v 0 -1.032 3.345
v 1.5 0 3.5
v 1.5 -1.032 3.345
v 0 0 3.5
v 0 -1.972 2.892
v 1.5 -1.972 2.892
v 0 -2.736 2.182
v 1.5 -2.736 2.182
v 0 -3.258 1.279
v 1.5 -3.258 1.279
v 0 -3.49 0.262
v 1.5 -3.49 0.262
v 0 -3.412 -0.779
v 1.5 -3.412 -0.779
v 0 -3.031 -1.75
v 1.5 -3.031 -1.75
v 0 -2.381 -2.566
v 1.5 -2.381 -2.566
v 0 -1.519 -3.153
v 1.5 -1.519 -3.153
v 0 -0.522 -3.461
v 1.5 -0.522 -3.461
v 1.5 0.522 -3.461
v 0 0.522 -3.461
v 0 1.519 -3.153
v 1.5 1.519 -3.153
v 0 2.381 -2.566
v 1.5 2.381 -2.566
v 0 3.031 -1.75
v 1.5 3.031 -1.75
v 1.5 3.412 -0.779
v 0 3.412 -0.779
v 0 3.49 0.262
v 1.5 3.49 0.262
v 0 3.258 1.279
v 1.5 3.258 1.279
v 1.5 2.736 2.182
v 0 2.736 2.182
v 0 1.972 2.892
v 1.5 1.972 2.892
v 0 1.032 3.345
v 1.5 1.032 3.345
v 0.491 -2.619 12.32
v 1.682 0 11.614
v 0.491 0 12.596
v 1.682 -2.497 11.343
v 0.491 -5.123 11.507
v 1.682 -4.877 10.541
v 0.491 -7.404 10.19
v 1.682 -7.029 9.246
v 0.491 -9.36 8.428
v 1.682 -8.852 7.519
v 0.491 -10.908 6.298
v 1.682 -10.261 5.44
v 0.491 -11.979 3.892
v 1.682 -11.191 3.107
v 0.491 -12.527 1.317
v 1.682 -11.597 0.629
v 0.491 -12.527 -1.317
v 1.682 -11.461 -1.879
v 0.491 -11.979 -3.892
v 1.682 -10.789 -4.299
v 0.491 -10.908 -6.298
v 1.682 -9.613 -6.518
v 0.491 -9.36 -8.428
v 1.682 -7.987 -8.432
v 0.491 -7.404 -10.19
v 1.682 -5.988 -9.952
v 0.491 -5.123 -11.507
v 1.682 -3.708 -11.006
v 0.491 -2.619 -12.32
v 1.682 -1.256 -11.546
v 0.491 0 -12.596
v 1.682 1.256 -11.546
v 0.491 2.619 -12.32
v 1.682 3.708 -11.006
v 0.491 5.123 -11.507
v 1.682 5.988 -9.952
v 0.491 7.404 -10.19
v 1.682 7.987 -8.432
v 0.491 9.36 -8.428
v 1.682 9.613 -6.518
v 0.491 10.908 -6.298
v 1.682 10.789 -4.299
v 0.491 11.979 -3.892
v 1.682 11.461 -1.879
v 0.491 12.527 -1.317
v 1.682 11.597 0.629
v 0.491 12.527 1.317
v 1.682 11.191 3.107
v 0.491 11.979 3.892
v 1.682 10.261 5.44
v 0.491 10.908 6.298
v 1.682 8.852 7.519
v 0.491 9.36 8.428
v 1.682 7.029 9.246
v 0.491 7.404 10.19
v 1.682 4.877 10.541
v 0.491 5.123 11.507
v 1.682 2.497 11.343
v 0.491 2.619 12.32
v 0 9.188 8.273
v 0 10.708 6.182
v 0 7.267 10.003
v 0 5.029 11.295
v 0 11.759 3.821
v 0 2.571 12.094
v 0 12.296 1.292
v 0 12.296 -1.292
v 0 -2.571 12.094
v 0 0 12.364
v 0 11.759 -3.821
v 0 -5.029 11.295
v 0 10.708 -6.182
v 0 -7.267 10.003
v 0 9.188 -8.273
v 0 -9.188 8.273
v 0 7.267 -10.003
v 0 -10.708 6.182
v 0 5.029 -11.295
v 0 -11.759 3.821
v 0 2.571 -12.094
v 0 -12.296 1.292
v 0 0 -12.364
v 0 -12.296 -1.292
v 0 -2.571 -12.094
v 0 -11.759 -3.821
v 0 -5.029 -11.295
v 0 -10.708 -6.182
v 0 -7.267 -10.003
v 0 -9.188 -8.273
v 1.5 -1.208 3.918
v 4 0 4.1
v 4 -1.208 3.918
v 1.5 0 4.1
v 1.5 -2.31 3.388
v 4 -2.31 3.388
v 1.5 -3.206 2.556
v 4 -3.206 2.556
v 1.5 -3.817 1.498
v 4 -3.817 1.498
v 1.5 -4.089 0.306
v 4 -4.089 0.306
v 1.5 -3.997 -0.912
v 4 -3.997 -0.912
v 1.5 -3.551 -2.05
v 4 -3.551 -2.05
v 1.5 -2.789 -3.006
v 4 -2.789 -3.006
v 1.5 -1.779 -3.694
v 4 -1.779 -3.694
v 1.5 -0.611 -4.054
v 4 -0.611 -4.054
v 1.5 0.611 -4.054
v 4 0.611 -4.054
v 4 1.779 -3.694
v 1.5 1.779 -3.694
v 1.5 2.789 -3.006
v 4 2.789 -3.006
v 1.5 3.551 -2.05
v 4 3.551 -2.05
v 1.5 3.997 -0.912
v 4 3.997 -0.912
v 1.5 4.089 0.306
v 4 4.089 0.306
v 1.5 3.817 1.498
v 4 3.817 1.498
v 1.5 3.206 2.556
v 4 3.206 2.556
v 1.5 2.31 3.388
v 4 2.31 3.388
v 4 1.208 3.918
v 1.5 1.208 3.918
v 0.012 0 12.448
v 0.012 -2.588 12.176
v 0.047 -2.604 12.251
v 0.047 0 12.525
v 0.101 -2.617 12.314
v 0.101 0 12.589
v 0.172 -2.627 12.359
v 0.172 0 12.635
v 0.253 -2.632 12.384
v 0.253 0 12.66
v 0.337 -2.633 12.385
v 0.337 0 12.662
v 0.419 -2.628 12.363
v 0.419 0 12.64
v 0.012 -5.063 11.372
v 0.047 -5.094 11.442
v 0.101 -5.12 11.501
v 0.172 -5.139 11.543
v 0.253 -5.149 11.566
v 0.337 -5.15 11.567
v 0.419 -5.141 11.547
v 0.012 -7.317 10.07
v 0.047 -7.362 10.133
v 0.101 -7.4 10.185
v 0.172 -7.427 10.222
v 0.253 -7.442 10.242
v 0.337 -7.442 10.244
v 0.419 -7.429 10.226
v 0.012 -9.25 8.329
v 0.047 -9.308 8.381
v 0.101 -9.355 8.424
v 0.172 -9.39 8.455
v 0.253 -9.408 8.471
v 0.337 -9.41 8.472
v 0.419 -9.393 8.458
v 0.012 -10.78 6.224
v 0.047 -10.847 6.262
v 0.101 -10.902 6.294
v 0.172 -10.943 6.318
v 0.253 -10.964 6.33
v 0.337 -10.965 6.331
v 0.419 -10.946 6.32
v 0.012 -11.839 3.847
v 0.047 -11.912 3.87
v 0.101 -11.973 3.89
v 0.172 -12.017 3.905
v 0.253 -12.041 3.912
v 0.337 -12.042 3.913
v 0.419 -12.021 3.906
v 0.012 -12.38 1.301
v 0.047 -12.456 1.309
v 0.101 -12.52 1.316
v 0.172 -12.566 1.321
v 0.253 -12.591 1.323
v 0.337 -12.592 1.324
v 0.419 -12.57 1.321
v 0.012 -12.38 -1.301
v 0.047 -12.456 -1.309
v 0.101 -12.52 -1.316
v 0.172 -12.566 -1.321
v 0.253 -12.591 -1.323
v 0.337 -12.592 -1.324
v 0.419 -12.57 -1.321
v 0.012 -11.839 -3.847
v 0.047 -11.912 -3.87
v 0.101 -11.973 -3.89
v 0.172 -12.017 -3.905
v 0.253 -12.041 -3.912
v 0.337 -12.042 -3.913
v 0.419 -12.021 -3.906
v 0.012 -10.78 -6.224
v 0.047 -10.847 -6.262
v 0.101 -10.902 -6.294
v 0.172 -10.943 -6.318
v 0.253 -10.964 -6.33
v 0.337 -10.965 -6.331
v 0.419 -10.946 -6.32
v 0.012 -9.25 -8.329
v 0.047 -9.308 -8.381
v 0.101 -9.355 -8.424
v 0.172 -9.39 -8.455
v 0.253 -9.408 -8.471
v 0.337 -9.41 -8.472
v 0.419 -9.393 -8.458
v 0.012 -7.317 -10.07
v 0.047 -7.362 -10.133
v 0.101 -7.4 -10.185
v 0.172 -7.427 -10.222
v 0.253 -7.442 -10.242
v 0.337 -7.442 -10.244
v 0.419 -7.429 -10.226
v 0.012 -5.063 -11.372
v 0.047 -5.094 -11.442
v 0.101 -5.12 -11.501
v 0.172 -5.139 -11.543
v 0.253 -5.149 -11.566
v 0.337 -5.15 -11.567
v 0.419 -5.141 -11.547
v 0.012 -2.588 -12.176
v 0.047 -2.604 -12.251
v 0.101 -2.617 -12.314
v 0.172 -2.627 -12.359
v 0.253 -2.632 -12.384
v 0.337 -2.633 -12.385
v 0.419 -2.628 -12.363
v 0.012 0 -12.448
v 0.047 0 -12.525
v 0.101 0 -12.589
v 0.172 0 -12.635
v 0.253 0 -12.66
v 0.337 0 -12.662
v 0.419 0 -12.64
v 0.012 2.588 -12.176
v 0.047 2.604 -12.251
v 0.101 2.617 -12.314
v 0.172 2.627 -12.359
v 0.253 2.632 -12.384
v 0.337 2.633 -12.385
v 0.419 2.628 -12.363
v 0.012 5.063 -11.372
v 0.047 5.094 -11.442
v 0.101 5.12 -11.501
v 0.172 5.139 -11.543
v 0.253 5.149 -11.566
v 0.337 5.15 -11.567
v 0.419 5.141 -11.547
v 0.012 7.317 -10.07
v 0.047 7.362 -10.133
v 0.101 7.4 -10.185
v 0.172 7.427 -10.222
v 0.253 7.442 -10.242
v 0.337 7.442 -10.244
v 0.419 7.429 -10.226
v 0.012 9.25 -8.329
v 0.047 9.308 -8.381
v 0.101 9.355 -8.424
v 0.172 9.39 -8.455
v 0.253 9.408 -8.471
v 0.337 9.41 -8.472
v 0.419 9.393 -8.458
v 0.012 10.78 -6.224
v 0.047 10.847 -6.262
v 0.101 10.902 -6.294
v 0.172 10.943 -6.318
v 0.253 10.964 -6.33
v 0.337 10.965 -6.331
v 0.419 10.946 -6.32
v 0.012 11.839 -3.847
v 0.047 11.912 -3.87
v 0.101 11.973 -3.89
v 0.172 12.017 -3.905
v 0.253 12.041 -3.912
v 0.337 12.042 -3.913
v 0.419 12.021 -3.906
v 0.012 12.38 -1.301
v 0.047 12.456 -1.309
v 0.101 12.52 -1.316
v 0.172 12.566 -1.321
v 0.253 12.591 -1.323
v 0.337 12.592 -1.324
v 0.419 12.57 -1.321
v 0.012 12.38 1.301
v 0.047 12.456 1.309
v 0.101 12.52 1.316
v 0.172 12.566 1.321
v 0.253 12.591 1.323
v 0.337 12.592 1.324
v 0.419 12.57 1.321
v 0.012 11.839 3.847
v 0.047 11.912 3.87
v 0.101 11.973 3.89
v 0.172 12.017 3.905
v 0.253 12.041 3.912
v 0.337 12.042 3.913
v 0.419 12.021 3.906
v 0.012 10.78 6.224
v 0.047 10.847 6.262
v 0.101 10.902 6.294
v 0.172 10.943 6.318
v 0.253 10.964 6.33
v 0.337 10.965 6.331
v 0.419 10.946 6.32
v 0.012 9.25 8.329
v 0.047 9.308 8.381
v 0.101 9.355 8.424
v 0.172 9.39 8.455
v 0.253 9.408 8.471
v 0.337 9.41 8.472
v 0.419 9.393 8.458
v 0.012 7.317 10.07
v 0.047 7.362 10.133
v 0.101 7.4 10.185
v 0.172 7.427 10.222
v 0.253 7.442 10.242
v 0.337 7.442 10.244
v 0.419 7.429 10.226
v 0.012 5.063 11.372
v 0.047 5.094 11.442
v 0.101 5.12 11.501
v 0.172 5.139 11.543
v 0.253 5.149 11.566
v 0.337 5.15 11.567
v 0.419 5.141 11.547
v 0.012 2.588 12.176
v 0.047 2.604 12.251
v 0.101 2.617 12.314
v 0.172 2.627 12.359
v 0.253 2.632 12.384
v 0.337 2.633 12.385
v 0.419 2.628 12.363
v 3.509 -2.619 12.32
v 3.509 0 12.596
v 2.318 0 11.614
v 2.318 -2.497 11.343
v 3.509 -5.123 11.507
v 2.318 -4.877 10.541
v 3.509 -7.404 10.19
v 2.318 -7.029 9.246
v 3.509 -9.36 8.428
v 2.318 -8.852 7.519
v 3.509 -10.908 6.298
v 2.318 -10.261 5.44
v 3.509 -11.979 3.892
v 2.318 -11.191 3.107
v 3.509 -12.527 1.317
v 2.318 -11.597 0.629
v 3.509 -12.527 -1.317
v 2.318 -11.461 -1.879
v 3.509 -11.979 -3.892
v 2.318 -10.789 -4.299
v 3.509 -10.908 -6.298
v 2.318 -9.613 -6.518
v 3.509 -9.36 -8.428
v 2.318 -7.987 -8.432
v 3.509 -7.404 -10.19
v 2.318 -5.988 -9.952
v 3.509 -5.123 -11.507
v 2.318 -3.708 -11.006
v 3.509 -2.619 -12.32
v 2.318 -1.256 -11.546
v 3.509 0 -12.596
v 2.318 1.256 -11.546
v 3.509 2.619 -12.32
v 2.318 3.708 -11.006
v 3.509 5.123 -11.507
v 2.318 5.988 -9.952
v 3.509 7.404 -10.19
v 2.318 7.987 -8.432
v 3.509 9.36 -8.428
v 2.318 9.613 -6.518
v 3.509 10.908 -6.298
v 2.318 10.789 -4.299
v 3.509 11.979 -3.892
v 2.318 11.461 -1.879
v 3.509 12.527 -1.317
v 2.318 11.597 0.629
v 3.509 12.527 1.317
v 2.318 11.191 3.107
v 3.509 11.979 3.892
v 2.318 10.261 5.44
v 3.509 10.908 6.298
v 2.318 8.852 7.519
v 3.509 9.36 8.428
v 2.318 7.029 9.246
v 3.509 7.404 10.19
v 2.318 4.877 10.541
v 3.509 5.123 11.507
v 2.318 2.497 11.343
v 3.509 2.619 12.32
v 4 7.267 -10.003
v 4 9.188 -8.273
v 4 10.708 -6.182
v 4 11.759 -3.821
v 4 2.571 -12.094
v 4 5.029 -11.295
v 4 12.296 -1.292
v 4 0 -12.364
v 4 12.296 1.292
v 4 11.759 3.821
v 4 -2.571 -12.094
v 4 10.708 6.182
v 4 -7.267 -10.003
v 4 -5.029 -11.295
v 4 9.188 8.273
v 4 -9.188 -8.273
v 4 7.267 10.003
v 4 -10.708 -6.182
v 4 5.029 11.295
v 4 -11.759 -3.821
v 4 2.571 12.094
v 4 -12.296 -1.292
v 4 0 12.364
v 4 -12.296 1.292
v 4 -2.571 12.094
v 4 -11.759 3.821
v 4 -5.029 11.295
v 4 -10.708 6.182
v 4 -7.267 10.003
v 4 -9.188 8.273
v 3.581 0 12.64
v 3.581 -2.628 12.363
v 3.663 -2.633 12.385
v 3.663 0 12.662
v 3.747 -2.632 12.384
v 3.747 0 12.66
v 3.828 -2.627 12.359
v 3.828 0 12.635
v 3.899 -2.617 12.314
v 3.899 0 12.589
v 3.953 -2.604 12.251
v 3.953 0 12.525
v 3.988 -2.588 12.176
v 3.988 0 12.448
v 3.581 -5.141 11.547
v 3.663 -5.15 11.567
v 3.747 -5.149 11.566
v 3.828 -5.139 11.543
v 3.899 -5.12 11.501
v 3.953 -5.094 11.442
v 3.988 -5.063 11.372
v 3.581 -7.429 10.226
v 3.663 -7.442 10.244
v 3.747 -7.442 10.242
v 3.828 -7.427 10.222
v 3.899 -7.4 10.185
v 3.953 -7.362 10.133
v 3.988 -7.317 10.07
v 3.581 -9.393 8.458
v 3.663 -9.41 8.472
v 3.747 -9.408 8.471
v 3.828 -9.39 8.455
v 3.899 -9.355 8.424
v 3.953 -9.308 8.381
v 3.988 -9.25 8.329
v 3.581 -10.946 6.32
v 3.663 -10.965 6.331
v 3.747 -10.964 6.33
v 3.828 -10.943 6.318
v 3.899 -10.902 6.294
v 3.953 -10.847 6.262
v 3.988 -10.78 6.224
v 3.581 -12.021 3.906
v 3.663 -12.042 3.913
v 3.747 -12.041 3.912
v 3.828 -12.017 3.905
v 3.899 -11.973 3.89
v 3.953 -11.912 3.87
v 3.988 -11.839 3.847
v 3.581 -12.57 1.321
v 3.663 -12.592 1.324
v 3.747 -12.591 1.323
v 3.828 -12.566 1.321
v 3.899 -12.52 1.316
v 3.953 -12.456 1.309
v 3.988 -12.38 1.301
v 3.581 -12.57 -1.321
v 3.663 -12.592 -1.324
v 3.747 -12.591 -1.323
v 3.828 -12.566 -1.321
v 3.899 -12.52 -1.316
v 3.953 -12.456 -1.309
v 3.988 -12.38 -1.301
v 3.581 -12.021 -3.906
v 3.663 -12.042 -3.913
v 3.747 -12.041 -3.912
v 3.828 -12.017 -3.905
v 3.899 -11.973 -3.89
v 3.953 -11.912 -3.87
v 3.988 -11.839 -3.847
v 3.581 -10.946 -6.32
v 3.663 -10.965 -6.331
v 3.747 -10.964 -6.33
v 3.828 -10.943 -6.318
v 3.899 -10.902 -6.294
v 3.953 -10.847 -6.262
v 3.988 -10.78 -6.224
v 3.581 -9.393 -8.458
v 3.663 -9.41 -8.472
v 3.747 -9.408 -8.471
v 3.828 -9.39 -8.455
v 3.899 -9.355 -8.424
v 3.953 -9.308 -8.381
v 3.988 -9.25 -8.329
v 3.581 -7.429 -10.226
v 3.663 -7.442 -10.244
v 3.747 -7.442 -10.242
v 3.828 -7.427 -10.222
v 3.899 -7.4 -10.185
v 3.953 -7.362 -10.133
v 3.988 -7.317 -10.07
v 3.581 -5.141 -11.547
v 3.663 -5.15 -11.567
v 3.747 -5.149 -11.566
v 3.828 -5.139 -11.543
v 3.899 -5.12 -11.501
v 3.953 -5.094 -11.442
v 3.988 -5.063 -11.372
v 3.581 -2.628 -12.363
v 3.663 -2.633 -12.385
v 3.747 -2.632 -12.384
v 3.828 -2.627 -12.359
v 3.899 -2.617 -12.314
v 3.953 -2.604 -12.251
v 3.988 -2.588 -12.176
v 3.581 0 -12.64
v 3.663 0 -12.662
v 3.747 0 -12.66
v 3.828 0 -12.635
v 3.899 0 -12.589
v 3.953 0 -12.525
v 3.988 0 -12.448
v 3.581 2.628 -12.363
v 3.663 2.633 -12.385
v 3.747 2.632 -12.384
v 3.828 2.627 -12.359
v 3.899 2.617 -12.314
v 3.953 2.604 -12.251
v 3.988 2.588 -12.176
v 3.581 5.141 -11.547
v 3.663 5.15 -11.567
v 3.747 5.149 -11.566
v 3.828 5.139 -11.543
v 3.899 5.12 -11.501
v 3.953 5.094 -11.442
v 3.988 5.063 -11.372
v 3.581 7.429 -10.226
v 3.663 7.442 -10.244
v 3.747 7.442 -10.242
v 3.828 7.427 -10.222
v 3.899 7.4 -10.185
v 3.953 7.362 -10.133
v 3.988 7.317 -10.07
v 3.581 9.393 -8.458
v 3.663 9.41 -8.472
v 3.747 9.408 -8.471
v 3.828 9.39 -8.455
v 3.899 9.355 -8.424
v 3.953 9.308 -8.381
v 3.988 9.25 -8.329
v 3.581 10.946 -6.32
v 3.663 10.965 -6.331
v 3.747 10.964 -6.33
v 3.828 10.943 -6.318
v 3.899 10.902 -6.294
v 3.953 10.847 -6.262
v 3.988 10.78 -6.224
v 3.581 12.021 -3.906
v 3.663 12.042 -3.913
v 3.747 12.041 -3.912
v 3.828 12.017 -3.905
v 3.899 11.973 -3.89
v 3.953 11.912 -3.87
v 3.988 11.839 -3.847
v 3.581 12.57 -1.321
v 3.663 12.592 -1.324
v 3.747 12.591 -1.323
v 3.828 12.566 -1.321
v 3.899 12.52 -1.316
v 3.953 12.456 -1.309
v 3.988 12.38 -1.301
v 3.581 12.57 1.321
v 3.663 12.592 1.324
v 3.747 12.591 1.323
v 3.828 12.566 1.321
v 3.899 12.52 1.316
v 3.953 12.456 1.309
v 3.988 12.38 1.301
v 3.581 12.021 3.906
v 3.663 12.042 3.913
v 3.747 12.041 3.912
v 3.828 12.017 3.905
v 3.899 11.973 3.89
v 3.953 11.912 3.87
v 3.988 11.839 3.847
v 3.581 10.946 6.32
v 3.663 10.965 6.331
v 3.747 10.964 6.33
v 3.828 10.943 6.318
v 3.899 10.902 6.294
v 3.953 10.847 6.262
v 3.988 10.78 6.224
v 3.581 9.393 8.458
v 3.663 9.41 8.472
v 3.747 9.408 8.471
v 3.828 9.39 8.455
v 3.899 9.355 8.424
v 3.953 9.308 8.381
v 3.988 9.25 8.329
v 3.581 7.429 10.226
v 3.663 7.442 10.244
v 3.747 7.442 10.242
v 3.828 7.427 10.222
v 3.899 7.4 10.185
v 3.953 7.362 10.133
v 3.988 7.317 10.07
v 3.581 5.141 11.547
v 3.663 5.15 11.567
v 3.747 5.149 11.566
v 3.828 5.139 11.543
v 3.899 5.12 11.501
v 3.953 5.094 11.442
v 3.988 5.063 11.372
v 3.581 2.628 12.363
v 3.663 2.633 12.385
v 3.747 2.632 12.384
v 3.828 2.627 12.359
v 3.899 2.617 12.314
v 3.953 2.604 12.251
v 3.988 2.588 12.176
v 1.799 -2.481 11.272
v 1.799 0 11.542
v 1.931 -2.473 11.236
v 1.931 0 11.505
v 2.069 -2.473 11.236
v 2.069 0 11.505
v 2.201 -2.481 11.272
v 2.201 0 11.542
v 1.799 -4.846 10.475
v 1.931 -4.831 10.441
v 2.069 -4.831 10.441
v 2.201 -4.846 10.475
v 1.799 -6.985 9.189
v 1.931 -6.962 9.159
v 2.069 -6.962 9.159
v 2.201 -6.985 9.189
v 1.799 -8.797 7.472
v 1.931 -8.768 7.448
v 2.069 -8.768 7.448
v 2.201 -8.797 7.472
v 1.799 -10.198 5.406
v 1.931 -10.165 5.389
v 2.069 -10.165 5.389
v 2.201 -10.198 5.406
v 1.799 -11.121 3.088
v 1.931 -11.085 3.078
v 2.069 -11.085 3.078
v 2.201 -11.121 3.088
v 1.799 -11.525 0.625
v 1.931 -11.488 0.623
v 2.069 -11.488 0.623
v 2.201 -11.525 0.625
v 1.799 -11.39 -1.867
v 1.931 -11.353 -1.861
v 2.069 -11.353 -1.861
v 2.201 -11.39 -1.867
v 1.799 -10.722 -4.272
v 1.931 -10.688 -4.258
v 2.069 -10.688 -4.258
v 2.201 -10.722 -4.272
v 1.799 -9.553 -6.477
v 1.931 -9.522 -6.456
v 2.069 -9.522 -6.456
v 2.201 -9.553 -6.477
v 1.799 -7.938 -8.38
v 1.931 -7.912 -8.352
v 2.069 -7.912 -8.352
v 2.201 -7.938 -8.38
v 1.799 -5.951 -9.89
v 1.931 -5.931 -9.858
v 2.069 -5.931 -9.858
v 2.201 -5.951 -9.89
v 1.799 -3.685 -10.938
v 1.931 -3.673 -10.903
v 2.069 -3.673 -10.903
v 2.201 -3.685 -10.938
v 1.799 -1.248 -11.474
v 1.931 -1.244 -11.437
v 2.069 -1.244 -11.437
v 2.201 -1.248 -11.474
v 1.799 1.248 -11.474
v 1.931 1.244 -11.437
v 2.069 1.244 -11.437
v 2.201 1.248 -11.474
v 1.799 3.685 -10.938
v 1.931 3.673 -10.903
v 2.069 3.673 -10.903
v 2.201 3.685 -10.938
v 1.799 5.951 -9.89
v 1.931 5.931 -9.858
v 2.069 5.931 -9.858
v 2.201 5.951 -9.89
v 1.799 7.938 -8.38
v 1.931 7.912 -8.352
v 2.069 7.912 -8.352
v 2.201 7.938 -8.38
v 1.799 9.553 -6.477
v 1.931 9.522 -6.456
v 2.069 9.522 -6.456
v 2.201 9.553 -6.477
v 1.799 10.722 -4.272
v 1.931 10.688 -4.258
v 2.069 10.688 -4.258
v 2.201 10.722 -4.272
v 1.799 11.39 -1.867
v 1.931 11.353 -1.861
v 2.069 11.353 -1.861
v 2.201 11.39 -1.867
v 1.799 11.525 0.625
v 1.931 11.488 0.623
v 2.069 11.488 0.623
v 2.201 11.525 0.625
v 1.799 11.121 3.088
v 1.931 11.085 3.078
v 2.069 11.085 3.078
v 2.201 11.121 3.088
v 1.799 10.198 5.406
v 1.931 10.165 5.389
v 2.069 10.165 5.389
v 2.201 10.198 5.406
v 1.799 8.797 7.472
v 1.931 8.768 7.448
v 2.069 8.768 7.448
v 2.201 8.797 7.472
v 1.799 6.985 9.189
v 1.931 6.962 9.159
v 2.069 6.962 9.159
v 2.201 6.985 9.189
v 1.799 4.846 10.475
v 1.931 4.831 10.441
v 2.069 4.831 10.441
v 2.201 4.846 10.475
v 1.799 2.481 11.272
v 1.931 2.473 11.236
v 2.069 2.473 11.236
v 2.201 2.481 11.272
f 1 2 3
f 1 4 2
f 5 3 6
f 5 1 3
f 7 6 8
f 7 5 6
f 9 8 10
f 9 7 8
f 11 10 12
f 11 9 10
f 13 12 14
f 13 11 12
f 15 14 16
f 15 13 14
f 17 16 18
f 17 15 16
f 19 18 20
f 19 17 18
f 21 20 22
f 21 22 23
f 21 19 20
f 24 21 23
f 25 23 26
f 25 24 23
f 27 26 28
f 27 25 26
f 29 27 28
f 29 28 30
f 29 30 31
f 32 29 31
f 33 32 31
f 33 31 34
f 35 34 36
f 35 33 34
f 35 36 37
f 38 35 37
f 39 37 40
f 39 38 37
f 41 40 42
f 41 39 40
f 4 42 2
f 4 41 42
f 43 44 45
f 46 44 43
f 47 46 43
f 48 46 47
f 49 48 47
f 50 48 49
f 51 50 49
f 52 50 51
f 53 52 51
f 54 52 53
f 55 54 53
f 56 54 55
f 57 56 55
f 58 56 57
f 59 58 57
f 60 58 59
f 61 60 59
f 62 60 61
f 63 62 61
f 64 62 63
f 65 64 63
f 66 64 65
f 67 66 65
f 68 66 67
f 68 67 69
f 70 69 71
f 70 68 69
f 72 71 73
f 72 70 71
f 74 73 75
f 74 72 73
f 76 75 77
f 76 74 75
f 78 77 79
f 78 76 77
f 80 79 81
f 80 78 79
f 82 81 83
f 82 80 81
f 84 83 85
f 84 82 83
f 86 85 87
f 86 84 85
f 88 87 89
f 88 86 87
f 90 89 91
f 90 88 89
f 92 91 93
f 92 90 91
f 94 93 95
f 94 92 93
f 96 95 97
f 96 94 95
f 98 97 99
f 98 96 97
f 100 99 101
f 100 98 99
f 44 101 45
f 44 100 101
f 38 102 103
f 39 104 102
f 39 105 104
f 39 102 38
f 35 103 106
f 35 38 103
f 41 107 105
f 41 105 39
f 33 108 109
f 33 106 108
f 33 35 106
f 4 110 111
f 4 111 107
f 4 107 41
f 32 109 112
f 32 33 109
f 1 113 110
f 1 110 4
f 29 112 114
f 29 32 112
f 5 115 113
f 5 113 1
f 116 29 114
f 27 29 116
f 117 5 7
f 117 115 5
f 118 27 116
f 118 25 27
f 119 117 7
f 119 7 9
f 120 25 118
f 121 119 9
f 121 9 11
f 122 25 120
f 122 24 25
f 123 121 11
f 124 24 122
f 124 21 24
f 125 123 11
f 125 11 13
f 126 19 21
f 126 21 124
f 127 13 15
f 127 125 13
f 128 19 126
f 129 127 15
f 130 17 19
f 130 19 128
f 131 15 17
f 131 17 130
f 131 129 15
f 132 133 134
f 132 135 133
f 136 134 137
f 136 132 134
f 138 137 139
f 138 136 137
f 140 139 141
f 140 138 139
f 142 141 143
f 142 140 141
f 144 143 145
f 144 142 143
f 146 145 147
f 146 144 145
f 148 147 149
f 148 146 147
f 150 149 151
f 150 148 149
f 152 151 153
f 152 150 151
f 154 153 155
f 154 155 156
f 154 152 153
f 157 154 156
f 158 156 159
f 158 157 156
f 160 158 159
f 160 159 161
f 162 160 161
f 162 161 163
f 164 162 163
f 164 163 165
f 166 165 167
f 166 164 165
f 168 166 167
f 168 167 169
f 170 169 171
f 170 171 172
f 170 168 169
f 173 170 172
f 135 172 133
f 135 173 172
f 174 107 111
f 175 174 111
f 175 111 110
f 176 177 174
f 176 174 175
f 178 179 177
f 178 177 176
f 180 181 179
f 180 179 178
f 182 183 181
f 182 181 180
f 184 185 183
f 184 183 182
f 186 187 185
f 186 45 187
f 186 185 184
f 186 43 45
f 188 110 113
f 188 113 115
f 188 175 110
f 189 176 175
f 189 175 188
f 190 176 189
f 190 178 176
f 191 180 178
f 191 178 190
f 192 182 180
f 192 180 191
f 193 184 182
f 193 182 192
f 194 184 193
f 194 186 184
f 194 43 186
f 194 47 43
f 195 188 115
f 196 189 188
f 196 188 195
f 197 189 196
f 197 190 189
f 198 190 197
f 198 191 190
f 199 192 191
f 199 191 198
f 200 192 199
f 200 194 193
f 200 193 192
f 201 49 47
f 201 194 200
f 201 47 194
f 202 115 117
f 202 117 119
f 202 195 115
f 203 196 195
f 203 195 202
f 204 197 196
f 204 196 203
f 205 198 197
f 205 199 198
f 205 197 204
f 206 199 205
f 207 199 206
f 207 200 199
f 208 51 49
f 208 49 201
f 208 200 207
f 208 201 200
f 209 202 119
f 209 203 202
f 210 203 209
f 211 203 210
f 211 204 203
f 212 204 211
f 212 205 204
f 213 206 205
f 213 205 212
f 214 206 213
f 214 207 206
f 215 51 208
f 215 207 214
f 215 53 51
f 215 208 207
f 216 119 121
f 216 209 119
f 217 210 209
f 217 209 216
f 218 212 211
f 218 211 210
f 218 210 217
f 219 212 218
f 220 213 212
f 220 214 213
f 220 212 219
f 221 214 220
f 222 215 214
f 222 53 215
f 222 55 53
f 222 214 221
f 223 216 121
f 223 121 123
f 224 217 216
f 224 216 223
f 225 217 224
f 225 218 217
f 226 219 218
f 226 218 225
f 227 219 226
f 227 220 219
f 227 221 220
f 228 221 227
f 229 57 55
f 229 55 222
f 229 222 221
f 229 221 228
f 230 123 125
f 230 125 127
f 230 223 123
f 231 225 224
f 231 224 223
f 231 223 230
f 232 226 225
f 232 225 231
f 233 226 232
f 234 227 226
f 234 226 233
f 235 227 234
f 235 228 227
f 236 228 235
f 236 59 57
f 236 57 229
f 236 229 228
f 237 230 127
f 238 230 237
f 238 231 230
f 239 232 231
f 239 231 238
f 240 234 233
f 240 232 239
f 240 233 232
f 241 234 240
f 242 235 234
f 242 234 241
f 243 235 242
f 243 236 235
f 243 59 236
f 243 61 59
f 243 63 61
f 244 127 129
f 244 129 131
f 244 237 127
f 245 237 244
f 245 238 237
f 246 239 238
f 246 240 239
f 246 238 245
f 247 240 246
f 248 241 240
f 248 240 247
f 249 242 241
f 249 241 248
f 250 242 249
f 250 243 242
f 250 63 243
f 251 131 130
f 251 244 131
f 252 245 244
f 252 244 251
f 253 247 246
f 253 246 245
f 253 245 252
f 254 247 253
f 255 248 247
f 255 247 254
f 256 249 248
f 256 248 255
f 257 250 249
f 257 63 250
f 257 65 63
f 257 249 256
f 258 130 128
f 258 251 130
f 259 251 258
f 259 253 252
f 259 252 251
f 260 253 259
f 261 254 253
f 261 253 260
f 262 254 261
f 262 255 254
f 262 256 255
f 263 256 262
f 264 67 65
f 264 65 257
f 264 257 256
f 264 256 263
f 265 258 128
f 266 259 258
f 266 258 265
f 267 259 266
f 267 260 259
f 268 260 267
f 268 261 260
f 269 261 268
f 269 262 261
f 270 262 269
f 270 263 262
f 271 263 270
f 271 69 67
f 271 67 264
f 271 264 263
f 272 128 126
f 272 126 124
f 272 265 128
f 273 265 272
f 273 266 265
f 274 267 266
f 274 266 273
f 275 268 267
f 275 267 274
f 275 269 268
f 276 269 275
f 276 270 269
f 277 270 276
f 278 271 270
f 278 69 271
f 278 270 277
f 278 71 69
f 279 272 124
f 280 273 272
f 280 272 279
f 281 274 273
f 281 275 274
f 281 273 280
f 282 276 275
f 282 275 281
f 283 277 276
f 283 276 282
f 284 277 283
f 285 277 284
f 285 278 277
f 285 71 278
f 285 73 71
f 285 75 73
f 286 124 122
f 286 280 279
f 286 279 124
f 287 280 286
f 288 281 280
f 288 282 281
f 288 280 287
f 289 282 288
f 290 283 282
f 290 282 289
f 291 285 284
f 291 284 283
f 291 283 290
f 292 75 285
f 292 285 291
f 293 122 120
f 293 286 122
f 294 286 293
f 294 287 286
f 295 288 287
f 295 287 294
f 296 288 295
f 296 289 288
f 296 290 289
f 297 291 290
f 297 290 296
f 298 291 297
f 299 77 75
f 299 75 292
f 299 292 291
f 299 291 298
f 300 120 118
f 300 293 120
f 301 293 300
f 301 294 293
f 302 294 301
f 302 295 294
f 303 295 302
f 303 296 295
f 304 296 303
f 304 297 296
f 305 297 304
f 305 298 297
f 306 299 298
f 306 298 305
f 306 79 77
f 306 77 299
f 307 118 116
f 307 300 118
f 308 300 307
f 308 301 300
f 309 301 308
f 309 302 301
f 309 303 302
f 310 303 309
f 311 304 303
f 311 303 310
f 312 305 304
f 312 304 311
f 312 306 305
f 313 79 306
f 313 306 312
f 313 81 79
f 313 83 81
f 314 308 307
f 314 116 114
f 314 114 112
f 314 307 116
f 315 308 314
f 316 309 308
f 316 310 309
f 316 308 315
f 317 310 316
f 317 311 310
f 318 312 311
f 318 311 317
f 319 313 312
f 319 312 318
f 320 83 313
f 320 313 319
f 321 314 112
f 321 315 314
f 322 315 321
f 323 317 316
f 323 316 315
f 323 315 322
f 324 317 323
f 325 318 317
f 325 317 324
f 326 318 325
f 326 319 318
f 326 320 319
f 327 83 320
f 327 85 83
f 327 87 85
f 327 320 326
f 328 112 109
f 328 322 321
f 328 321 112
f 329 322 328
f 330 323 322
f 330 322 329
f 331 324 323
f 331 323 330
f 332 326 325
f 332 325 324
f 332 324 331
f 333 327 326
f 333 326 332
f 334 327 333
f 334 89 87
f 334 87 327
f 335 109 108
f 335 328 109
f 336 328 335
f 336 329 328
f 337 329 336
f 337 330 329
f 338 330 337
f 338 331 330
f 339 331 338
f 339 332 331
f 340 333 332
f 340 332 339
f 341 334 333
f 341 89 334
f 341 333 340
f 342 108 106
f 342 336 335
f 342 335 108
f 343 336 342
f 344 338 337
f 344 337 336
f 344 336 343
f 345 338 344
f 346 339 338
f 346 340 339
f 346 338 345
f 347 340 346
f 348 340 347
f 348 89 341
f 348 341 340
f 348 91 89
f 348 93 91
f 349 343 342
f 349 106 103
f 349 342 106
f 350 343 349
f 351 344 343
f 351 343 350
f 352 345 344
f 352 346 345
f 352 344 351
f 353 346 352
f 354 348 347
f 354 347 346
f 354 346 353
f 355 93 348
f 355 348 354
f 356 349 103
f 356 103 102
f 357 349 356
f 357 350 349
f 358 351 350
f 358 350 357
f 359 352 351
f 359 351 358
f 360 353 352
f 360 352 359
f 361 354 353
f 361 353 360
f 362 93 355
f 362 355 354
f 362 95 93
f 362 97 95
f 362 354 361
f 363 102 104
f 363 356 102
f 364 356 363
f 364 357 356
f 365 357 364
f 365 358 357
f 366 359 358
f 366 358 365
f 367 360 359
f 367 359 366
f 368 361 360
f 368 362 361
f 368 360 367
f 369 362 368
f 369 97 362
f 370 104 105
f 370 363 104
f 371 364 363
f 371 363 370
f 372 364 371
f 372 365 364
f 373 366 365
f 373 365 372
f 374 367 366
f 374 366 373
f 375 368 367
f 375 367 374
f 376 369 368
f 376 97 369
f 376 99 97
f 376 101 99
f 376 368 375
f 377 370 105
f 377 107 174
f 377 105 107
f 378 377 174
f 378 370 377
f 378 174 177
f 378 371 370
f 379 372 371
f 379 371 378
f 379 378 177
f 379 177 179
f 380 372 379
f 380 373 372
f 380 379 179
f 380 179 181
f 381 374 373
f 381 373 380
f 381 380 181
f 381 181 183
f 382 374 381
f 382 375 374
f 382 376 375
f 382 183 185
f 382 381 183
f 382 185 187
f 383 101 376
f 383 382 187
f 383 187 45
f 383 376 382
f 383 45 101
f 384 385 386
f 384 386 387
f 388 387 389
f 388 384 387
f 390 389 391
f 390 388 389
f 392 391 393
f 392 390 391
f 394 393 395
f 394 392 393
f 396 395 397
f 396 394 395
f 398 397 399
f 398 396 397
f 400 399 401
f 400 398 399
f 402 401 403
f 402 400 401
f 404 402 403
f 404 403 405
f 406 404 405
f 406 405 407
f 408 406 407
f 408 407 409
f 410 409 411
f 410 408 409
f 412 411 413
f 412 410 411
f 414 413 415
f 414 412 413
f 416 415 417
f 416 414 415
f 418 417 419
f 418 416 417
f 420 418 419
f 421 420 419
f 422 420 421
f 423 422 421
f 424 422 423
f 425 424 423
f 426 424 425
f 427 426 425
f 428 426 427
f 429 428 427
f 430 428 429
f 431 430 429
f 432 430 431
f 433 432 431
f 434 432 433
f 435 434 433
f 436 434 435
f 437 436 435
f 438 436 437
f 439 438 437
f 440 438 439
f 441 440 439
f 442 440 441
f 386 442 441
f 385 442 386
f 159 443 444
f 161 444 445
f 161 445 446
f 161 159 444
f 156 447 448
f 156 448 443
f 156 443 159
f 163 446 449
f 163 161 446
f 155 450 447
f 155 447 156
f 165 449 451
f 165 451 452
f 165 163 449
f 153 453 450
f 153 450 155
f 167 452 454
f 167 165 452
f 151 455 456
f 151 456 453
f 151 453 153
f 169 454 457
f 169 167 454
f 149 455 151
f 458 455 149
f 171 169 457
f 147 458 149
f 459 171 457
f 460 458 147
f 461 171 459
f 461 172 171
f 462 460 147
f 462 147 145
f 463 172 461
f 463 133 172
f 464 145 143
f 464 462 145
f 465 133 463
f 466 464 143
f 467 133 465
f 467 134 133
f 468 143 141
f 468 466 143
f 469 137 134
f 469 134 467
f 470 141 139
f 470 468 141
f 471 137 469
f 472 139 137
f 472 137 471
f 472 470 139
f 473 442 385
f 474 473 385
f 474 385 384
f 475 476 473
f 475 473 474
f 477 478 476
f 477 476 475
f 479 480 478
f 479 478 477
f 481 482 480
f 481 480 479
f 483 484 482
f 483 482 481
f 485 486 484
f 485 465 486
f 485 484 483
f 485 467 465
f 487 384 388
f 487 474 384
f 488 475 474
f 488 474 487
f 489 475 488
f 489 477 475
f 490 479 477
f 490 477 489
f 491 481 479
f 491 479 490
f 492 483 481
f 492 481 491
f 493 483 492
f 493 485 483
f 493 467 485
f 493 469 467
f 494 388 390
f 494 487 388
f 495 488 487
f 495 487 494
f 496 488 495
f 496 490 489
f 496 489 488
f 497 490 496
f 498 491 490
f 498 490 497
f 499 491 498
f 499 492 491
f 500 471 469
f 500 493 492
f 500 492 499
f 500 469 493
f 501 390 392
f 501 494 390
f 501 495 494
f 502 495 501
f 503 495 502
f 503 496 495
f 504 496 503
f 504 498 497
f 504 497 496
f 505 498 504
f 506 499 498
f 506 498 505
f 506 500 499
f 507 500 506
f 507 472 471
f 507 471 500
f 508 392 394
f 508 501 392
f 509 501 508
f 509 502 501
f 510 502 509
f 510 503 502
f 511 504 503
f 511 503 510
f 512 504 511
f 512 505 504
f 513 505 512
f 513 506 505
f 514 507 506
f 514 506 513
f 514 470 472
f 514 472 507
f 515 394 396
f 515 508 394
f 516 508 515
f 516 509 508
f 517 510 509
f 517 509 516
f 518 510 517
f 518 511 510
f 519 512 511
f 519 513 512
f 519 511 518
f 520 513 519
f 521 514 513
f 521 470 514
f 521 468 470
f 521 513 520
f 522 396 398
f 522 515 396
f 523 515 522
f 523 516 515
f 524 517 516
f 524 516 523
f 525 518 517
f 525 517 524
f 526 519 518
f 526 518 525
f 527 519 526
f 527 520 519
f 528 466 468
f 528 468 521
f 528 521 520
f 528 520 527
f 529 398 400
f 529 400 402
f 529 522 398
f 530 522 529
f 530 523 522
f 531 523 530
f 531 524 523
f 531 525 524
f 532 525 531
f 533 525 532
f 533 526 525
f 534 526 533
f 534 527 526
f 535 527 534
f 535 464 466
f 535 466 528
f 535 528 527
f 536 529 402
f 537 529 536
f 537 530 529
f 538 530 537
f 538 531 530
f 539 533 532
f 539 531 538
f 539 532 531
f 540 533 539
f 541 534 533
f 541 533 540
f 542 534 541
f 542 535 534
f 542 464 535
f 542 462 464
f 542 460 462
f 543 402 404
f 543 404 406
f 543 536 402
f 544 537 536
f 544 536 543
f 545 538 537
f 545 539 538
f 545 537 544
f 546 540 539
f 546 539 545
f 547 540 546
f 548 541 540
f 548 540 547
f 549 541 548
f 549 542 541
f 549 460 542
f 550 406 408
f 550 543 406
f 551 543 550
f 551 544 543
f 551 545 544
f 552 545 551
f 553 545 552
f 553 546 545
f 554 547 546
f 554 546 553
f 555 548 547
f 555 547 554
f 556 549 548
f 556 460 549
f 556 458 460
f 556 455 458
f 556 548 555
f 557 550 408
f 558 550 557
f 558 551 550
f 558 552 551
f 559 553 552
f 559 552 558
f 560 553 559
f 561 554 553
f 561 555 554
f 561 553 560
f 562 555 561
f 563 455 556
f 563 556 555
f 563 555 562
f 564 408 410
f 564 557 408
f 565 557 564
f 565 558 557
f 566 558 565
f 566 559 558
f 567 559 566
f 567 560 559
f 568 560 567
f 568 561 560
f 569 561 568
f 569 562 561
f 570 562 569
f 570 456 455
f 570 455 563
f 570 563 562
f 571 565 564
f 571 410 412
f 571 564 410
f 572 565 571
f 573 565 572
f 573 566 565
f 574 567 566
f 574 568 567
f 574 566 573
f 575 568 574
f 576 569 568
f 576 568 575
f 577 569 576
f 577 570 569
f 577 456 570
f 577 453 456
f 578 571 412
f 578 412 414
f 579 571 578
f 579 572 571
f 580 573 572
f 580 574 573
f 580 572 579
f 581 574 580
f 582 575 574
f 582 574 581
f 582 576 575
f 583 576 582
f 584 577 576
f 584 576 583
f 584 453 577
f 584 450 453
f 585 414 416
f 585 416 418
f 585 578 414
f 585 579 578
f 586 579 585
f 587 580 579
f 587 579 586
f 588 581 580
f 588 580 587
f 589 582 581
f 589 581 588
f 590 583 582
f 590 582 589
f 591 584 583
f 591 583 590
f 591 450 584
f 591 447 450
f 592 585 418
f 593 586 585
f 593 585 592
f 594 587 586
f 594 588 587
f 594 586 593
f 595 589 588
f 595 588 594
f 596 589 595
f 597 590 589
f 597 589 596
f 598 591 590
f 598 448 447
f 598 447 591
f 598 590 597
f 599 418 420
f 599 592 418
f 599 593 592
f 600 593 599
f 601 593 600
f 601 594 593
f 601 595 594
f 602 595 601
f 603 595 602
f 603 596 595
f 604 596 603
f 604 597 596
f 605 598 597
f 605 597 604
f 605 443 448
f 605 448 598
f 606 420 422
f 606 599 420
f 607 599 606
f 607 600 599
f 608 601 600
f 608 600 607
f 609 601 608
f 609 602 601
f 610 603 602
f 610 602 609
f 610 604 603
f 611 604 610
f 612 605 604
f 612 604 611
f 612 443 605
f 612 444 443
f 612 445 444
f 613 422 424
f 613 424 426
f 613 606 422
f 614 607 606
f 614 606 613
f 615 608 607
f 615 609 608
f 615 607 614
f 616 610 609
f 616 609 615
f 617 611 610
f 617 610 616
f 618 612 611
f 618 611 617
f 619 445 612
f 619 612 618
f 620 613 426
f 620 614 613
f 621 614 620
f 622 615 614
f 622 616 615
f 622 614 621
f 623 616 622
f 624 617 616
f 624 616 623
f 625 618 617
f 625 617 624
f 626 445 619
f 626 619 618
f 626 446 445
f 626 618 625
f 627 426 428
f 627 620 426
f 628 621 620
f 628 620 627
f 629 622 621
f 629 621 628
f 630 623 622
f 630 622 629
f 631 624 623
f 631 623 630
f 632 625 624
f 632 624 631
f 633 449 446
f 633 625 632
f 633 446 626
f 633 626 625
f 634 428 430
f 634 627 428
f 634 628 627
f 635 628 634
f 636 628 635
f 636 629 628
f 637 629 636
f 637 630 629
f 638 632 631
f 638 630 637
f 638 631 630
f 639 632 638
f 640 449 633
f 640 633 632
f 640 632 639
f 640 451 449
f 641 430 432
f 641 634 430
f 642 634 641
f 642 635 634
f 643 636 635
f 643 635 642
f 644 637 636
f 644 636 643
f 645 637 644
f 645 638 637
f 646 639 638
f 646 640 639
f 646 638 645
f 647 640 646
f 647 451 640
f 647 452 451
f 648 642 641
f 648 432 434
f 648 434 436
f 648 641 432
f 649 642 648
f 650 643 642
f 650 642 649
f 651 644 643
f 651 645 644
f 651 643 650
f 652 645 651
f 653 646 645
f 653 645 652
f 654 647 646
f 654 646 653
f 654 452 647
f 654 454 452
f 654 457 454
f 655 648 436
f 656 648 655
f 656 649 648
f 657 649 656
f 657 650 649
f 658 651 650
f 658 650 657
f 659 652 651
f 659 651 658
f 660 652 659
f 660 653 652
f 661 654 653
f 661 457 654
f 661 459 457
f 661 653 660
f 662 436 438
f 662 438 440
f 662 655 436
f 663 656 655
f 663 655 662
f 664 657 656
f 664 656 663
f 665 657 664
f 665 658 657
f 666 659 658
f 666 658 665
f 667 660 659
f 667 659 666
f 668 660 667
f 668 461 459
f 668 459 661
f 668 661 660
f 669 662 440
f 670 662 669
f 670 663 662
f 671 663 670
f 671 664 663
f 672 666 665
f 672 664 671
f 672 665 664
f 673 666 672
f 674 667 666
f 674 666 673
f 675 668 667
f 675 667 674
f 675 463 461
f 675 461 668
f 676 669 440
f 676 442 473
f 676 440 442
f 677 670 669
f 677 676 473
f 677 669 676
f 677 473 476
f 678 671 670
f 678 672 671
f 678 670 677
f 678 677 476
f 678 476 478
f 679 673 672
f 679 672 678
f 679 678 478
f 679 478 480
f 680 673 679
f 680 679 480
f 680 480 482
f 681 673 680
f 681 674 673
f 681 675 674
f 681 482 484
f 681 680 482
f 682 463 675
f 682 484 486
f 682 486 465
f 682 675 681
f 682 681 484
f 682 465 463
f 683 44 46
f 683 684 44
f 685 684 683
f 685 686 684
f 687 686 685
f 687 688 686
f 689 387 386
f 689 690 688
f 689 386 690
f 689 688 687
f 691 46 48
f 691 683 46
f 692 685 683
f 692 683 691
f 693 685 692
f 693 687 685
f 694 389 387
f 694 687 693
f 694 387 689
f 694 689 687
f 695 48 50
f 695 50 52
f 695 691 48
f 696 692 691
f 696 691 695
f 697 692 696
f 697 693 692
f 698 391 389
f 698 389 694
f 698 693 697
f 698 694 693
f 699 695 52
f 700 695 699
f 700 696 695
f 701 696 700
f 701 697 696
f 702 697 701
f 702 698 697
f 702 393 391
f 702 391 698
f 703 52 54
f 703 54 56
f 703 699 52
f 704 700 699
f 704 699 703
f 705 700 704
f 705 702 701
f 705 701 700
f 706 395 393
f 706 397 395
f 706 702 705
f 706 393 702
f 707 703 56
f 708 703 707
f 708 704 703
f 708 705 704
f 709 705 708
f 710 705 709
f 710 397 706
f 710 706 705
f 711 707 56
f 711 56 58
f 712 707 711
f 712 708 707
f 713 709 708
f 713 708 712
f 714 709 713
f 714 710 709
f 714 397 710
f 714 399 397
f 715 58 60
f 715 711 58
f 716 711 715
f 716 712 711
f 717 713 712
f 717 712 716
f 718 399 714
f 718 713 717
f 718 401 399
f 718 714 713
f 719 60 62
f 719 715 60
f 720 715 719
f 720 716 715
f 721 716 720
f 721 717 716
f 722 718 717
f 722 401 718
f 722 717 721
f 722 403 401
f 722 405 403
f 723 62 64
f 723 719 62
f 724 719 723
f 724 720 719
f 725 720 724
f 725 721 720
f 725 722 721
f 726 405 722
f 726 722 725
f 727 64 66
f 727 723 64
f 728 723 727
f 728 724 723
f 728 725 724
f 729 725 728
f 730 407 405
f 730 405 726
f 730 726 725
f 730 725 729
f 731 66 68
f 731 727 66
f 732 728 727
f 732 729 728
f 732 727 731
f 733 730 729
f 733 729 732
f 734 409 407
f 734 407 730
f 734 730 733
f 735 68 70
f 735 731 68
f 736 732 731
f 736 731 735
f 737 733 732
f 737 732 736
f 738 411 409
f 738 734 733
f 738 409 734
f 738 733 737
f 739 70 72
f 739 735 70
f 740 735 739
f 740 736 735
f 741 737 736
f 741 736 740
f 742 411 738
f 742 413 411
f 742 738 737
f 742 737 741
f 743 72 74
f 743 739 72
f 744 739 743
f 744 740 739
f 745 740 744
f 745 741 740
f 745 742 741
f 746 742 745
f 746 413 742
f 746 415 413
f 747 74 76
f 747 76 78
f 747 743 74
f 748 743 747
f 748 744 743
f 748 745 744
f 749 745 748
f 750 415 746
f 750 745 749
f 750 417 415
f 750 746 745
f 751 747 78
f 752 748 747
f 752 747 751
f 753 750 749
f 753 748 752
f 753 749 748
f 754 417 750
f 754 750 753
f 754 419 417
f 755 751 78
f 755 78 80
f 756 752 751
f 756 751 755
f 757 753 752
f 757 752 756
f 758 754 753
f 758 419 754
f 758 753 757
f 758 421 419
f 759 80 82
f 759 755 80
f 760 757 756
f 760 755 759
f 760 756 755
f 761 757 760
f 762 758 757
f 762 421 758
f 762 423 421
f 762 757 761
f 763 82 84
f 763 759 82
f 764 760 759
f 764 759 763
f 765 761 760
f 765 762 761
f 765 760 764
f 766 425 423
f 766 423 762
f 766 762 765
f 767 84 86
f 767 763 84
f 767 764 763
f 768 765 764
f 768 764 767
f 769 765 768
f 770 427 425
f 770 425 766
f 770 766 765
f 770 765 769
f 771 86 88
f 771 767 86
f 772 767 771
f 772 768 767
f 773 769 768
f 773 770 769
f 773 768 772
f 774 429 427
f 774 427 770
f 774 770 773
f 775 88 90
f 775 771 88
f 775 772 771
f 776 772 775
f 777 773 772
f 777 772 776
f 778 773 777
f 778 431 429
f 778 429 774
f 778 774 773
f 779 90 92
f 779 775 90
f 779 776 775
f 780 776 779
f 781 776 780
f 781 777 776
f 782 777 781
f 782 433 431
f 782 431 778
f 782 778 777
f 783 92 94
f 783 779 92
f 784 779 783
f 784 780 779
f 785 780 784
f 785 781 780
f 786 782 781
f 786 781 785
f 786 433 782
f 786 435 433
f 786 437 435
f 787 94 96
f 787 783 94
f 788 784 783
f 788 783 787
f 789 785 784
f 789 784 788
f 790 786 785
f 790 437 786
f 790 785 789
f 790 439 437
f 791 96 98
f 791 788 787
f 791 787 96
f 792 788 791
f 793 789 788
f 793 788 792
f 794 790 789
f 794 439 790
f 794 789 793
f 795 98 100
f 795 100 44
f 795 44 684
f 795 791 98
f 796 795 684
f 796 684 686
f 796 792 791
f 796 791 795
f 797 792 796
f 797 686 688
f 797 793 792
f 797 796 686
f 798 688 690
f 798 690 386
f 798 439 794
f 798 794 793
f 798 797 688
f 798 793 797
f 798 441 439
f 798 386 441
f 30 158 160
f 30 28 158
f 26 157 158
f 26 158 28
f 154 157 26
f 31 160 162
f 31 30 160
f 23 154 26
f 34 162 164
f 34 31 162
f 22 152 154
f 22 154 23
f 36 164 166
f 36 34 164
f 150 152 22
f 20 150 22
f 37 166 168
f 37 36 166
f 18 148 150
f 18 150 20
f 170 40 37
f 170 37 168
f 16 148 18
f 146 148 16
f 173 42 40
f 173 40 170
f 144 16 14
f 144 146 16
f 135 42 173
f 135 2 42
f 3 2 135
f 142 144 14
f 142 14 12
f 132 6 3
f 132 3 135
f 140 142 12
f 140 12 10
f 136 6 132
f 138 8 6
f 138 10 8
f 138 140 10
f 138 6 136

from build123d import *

# Parameters (mm, degrees)
FILLET1_R = 0.3


with BuildPart() as part:
    # Sketch1 → Revolve1 (revolve)
    with BuildSketch(Plane.XY, mode=Mode.PRIVATE) as revolve1_sk:
        with BuildLine():
            Line((0, 3.5), (0, 13))
            Line((0, 13), (1.682055053, 11.614110106))
            ThreePointArc((1.682055053, 11.614110106), (2, 11.5), (2.317944947, 11.614110106))
            Line((2.317944947, 11.614110106), (4, 13))
            Line((4, 13), (4, 4.1))
            Line((4, 4.1), (1.5, 4.1))
            Line((1.5, 4.1), (1.5, 3.5))
            Line((1.5, 3.5), (0, 3.5))
        make_face()
    revolve(revolve1_sk.sketch.rotate(Axis((0, 0, 0), (1, 0, 0)), 90), axis=Axis((0, 0, 0), (1, 0, 0)))

    # Fillet1
    fillet1_edges = [part.edges().sort_by_distance(p)[0] for p in [
        (0, 0, -13),
        (4, 0, -13),
    ]]
    fillet(fillet1_edges, radius=FILLET1_R)


solid = part.part
